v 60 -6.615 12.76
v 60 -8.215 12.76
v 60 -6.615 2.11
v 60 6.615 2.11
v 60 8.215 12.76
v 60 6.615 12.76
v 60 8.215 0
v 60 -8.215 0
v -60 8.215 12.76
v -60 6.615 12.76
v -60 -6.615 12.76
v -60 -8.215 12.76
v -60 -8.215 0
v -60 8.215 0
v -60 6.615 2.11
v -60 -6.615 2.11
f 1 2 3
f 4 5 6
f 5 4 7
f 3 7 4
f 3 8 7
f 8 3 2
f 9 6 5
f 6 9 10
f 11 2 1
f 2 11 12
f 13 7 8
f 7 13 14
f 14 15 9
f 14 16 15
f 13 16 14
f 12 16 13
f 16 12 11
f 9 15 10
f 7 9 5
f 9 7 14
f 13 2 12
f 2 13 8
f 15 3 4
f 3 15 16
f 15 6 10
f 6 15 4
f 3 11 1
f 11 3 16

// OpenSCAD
// generate C-channel for later use in cut-outs

mW = 16.33;
mH = 12.66;
L = 120;
pad=.1;
W = mW+pad;
H = mH+pad;
block = [L,W,H];
cutW = (1.5 * 2) + (pad * 2);
cutH = (2.0 + pad);

module abar(bblock=block){

translate([0,0,H/2])
difference(){
	cube(bblock, center=true);
	
	translate([0,0,cutH/2+.01])
		cube([L,W-cutW, H-cutH], center=true);
	}
}

abar();
